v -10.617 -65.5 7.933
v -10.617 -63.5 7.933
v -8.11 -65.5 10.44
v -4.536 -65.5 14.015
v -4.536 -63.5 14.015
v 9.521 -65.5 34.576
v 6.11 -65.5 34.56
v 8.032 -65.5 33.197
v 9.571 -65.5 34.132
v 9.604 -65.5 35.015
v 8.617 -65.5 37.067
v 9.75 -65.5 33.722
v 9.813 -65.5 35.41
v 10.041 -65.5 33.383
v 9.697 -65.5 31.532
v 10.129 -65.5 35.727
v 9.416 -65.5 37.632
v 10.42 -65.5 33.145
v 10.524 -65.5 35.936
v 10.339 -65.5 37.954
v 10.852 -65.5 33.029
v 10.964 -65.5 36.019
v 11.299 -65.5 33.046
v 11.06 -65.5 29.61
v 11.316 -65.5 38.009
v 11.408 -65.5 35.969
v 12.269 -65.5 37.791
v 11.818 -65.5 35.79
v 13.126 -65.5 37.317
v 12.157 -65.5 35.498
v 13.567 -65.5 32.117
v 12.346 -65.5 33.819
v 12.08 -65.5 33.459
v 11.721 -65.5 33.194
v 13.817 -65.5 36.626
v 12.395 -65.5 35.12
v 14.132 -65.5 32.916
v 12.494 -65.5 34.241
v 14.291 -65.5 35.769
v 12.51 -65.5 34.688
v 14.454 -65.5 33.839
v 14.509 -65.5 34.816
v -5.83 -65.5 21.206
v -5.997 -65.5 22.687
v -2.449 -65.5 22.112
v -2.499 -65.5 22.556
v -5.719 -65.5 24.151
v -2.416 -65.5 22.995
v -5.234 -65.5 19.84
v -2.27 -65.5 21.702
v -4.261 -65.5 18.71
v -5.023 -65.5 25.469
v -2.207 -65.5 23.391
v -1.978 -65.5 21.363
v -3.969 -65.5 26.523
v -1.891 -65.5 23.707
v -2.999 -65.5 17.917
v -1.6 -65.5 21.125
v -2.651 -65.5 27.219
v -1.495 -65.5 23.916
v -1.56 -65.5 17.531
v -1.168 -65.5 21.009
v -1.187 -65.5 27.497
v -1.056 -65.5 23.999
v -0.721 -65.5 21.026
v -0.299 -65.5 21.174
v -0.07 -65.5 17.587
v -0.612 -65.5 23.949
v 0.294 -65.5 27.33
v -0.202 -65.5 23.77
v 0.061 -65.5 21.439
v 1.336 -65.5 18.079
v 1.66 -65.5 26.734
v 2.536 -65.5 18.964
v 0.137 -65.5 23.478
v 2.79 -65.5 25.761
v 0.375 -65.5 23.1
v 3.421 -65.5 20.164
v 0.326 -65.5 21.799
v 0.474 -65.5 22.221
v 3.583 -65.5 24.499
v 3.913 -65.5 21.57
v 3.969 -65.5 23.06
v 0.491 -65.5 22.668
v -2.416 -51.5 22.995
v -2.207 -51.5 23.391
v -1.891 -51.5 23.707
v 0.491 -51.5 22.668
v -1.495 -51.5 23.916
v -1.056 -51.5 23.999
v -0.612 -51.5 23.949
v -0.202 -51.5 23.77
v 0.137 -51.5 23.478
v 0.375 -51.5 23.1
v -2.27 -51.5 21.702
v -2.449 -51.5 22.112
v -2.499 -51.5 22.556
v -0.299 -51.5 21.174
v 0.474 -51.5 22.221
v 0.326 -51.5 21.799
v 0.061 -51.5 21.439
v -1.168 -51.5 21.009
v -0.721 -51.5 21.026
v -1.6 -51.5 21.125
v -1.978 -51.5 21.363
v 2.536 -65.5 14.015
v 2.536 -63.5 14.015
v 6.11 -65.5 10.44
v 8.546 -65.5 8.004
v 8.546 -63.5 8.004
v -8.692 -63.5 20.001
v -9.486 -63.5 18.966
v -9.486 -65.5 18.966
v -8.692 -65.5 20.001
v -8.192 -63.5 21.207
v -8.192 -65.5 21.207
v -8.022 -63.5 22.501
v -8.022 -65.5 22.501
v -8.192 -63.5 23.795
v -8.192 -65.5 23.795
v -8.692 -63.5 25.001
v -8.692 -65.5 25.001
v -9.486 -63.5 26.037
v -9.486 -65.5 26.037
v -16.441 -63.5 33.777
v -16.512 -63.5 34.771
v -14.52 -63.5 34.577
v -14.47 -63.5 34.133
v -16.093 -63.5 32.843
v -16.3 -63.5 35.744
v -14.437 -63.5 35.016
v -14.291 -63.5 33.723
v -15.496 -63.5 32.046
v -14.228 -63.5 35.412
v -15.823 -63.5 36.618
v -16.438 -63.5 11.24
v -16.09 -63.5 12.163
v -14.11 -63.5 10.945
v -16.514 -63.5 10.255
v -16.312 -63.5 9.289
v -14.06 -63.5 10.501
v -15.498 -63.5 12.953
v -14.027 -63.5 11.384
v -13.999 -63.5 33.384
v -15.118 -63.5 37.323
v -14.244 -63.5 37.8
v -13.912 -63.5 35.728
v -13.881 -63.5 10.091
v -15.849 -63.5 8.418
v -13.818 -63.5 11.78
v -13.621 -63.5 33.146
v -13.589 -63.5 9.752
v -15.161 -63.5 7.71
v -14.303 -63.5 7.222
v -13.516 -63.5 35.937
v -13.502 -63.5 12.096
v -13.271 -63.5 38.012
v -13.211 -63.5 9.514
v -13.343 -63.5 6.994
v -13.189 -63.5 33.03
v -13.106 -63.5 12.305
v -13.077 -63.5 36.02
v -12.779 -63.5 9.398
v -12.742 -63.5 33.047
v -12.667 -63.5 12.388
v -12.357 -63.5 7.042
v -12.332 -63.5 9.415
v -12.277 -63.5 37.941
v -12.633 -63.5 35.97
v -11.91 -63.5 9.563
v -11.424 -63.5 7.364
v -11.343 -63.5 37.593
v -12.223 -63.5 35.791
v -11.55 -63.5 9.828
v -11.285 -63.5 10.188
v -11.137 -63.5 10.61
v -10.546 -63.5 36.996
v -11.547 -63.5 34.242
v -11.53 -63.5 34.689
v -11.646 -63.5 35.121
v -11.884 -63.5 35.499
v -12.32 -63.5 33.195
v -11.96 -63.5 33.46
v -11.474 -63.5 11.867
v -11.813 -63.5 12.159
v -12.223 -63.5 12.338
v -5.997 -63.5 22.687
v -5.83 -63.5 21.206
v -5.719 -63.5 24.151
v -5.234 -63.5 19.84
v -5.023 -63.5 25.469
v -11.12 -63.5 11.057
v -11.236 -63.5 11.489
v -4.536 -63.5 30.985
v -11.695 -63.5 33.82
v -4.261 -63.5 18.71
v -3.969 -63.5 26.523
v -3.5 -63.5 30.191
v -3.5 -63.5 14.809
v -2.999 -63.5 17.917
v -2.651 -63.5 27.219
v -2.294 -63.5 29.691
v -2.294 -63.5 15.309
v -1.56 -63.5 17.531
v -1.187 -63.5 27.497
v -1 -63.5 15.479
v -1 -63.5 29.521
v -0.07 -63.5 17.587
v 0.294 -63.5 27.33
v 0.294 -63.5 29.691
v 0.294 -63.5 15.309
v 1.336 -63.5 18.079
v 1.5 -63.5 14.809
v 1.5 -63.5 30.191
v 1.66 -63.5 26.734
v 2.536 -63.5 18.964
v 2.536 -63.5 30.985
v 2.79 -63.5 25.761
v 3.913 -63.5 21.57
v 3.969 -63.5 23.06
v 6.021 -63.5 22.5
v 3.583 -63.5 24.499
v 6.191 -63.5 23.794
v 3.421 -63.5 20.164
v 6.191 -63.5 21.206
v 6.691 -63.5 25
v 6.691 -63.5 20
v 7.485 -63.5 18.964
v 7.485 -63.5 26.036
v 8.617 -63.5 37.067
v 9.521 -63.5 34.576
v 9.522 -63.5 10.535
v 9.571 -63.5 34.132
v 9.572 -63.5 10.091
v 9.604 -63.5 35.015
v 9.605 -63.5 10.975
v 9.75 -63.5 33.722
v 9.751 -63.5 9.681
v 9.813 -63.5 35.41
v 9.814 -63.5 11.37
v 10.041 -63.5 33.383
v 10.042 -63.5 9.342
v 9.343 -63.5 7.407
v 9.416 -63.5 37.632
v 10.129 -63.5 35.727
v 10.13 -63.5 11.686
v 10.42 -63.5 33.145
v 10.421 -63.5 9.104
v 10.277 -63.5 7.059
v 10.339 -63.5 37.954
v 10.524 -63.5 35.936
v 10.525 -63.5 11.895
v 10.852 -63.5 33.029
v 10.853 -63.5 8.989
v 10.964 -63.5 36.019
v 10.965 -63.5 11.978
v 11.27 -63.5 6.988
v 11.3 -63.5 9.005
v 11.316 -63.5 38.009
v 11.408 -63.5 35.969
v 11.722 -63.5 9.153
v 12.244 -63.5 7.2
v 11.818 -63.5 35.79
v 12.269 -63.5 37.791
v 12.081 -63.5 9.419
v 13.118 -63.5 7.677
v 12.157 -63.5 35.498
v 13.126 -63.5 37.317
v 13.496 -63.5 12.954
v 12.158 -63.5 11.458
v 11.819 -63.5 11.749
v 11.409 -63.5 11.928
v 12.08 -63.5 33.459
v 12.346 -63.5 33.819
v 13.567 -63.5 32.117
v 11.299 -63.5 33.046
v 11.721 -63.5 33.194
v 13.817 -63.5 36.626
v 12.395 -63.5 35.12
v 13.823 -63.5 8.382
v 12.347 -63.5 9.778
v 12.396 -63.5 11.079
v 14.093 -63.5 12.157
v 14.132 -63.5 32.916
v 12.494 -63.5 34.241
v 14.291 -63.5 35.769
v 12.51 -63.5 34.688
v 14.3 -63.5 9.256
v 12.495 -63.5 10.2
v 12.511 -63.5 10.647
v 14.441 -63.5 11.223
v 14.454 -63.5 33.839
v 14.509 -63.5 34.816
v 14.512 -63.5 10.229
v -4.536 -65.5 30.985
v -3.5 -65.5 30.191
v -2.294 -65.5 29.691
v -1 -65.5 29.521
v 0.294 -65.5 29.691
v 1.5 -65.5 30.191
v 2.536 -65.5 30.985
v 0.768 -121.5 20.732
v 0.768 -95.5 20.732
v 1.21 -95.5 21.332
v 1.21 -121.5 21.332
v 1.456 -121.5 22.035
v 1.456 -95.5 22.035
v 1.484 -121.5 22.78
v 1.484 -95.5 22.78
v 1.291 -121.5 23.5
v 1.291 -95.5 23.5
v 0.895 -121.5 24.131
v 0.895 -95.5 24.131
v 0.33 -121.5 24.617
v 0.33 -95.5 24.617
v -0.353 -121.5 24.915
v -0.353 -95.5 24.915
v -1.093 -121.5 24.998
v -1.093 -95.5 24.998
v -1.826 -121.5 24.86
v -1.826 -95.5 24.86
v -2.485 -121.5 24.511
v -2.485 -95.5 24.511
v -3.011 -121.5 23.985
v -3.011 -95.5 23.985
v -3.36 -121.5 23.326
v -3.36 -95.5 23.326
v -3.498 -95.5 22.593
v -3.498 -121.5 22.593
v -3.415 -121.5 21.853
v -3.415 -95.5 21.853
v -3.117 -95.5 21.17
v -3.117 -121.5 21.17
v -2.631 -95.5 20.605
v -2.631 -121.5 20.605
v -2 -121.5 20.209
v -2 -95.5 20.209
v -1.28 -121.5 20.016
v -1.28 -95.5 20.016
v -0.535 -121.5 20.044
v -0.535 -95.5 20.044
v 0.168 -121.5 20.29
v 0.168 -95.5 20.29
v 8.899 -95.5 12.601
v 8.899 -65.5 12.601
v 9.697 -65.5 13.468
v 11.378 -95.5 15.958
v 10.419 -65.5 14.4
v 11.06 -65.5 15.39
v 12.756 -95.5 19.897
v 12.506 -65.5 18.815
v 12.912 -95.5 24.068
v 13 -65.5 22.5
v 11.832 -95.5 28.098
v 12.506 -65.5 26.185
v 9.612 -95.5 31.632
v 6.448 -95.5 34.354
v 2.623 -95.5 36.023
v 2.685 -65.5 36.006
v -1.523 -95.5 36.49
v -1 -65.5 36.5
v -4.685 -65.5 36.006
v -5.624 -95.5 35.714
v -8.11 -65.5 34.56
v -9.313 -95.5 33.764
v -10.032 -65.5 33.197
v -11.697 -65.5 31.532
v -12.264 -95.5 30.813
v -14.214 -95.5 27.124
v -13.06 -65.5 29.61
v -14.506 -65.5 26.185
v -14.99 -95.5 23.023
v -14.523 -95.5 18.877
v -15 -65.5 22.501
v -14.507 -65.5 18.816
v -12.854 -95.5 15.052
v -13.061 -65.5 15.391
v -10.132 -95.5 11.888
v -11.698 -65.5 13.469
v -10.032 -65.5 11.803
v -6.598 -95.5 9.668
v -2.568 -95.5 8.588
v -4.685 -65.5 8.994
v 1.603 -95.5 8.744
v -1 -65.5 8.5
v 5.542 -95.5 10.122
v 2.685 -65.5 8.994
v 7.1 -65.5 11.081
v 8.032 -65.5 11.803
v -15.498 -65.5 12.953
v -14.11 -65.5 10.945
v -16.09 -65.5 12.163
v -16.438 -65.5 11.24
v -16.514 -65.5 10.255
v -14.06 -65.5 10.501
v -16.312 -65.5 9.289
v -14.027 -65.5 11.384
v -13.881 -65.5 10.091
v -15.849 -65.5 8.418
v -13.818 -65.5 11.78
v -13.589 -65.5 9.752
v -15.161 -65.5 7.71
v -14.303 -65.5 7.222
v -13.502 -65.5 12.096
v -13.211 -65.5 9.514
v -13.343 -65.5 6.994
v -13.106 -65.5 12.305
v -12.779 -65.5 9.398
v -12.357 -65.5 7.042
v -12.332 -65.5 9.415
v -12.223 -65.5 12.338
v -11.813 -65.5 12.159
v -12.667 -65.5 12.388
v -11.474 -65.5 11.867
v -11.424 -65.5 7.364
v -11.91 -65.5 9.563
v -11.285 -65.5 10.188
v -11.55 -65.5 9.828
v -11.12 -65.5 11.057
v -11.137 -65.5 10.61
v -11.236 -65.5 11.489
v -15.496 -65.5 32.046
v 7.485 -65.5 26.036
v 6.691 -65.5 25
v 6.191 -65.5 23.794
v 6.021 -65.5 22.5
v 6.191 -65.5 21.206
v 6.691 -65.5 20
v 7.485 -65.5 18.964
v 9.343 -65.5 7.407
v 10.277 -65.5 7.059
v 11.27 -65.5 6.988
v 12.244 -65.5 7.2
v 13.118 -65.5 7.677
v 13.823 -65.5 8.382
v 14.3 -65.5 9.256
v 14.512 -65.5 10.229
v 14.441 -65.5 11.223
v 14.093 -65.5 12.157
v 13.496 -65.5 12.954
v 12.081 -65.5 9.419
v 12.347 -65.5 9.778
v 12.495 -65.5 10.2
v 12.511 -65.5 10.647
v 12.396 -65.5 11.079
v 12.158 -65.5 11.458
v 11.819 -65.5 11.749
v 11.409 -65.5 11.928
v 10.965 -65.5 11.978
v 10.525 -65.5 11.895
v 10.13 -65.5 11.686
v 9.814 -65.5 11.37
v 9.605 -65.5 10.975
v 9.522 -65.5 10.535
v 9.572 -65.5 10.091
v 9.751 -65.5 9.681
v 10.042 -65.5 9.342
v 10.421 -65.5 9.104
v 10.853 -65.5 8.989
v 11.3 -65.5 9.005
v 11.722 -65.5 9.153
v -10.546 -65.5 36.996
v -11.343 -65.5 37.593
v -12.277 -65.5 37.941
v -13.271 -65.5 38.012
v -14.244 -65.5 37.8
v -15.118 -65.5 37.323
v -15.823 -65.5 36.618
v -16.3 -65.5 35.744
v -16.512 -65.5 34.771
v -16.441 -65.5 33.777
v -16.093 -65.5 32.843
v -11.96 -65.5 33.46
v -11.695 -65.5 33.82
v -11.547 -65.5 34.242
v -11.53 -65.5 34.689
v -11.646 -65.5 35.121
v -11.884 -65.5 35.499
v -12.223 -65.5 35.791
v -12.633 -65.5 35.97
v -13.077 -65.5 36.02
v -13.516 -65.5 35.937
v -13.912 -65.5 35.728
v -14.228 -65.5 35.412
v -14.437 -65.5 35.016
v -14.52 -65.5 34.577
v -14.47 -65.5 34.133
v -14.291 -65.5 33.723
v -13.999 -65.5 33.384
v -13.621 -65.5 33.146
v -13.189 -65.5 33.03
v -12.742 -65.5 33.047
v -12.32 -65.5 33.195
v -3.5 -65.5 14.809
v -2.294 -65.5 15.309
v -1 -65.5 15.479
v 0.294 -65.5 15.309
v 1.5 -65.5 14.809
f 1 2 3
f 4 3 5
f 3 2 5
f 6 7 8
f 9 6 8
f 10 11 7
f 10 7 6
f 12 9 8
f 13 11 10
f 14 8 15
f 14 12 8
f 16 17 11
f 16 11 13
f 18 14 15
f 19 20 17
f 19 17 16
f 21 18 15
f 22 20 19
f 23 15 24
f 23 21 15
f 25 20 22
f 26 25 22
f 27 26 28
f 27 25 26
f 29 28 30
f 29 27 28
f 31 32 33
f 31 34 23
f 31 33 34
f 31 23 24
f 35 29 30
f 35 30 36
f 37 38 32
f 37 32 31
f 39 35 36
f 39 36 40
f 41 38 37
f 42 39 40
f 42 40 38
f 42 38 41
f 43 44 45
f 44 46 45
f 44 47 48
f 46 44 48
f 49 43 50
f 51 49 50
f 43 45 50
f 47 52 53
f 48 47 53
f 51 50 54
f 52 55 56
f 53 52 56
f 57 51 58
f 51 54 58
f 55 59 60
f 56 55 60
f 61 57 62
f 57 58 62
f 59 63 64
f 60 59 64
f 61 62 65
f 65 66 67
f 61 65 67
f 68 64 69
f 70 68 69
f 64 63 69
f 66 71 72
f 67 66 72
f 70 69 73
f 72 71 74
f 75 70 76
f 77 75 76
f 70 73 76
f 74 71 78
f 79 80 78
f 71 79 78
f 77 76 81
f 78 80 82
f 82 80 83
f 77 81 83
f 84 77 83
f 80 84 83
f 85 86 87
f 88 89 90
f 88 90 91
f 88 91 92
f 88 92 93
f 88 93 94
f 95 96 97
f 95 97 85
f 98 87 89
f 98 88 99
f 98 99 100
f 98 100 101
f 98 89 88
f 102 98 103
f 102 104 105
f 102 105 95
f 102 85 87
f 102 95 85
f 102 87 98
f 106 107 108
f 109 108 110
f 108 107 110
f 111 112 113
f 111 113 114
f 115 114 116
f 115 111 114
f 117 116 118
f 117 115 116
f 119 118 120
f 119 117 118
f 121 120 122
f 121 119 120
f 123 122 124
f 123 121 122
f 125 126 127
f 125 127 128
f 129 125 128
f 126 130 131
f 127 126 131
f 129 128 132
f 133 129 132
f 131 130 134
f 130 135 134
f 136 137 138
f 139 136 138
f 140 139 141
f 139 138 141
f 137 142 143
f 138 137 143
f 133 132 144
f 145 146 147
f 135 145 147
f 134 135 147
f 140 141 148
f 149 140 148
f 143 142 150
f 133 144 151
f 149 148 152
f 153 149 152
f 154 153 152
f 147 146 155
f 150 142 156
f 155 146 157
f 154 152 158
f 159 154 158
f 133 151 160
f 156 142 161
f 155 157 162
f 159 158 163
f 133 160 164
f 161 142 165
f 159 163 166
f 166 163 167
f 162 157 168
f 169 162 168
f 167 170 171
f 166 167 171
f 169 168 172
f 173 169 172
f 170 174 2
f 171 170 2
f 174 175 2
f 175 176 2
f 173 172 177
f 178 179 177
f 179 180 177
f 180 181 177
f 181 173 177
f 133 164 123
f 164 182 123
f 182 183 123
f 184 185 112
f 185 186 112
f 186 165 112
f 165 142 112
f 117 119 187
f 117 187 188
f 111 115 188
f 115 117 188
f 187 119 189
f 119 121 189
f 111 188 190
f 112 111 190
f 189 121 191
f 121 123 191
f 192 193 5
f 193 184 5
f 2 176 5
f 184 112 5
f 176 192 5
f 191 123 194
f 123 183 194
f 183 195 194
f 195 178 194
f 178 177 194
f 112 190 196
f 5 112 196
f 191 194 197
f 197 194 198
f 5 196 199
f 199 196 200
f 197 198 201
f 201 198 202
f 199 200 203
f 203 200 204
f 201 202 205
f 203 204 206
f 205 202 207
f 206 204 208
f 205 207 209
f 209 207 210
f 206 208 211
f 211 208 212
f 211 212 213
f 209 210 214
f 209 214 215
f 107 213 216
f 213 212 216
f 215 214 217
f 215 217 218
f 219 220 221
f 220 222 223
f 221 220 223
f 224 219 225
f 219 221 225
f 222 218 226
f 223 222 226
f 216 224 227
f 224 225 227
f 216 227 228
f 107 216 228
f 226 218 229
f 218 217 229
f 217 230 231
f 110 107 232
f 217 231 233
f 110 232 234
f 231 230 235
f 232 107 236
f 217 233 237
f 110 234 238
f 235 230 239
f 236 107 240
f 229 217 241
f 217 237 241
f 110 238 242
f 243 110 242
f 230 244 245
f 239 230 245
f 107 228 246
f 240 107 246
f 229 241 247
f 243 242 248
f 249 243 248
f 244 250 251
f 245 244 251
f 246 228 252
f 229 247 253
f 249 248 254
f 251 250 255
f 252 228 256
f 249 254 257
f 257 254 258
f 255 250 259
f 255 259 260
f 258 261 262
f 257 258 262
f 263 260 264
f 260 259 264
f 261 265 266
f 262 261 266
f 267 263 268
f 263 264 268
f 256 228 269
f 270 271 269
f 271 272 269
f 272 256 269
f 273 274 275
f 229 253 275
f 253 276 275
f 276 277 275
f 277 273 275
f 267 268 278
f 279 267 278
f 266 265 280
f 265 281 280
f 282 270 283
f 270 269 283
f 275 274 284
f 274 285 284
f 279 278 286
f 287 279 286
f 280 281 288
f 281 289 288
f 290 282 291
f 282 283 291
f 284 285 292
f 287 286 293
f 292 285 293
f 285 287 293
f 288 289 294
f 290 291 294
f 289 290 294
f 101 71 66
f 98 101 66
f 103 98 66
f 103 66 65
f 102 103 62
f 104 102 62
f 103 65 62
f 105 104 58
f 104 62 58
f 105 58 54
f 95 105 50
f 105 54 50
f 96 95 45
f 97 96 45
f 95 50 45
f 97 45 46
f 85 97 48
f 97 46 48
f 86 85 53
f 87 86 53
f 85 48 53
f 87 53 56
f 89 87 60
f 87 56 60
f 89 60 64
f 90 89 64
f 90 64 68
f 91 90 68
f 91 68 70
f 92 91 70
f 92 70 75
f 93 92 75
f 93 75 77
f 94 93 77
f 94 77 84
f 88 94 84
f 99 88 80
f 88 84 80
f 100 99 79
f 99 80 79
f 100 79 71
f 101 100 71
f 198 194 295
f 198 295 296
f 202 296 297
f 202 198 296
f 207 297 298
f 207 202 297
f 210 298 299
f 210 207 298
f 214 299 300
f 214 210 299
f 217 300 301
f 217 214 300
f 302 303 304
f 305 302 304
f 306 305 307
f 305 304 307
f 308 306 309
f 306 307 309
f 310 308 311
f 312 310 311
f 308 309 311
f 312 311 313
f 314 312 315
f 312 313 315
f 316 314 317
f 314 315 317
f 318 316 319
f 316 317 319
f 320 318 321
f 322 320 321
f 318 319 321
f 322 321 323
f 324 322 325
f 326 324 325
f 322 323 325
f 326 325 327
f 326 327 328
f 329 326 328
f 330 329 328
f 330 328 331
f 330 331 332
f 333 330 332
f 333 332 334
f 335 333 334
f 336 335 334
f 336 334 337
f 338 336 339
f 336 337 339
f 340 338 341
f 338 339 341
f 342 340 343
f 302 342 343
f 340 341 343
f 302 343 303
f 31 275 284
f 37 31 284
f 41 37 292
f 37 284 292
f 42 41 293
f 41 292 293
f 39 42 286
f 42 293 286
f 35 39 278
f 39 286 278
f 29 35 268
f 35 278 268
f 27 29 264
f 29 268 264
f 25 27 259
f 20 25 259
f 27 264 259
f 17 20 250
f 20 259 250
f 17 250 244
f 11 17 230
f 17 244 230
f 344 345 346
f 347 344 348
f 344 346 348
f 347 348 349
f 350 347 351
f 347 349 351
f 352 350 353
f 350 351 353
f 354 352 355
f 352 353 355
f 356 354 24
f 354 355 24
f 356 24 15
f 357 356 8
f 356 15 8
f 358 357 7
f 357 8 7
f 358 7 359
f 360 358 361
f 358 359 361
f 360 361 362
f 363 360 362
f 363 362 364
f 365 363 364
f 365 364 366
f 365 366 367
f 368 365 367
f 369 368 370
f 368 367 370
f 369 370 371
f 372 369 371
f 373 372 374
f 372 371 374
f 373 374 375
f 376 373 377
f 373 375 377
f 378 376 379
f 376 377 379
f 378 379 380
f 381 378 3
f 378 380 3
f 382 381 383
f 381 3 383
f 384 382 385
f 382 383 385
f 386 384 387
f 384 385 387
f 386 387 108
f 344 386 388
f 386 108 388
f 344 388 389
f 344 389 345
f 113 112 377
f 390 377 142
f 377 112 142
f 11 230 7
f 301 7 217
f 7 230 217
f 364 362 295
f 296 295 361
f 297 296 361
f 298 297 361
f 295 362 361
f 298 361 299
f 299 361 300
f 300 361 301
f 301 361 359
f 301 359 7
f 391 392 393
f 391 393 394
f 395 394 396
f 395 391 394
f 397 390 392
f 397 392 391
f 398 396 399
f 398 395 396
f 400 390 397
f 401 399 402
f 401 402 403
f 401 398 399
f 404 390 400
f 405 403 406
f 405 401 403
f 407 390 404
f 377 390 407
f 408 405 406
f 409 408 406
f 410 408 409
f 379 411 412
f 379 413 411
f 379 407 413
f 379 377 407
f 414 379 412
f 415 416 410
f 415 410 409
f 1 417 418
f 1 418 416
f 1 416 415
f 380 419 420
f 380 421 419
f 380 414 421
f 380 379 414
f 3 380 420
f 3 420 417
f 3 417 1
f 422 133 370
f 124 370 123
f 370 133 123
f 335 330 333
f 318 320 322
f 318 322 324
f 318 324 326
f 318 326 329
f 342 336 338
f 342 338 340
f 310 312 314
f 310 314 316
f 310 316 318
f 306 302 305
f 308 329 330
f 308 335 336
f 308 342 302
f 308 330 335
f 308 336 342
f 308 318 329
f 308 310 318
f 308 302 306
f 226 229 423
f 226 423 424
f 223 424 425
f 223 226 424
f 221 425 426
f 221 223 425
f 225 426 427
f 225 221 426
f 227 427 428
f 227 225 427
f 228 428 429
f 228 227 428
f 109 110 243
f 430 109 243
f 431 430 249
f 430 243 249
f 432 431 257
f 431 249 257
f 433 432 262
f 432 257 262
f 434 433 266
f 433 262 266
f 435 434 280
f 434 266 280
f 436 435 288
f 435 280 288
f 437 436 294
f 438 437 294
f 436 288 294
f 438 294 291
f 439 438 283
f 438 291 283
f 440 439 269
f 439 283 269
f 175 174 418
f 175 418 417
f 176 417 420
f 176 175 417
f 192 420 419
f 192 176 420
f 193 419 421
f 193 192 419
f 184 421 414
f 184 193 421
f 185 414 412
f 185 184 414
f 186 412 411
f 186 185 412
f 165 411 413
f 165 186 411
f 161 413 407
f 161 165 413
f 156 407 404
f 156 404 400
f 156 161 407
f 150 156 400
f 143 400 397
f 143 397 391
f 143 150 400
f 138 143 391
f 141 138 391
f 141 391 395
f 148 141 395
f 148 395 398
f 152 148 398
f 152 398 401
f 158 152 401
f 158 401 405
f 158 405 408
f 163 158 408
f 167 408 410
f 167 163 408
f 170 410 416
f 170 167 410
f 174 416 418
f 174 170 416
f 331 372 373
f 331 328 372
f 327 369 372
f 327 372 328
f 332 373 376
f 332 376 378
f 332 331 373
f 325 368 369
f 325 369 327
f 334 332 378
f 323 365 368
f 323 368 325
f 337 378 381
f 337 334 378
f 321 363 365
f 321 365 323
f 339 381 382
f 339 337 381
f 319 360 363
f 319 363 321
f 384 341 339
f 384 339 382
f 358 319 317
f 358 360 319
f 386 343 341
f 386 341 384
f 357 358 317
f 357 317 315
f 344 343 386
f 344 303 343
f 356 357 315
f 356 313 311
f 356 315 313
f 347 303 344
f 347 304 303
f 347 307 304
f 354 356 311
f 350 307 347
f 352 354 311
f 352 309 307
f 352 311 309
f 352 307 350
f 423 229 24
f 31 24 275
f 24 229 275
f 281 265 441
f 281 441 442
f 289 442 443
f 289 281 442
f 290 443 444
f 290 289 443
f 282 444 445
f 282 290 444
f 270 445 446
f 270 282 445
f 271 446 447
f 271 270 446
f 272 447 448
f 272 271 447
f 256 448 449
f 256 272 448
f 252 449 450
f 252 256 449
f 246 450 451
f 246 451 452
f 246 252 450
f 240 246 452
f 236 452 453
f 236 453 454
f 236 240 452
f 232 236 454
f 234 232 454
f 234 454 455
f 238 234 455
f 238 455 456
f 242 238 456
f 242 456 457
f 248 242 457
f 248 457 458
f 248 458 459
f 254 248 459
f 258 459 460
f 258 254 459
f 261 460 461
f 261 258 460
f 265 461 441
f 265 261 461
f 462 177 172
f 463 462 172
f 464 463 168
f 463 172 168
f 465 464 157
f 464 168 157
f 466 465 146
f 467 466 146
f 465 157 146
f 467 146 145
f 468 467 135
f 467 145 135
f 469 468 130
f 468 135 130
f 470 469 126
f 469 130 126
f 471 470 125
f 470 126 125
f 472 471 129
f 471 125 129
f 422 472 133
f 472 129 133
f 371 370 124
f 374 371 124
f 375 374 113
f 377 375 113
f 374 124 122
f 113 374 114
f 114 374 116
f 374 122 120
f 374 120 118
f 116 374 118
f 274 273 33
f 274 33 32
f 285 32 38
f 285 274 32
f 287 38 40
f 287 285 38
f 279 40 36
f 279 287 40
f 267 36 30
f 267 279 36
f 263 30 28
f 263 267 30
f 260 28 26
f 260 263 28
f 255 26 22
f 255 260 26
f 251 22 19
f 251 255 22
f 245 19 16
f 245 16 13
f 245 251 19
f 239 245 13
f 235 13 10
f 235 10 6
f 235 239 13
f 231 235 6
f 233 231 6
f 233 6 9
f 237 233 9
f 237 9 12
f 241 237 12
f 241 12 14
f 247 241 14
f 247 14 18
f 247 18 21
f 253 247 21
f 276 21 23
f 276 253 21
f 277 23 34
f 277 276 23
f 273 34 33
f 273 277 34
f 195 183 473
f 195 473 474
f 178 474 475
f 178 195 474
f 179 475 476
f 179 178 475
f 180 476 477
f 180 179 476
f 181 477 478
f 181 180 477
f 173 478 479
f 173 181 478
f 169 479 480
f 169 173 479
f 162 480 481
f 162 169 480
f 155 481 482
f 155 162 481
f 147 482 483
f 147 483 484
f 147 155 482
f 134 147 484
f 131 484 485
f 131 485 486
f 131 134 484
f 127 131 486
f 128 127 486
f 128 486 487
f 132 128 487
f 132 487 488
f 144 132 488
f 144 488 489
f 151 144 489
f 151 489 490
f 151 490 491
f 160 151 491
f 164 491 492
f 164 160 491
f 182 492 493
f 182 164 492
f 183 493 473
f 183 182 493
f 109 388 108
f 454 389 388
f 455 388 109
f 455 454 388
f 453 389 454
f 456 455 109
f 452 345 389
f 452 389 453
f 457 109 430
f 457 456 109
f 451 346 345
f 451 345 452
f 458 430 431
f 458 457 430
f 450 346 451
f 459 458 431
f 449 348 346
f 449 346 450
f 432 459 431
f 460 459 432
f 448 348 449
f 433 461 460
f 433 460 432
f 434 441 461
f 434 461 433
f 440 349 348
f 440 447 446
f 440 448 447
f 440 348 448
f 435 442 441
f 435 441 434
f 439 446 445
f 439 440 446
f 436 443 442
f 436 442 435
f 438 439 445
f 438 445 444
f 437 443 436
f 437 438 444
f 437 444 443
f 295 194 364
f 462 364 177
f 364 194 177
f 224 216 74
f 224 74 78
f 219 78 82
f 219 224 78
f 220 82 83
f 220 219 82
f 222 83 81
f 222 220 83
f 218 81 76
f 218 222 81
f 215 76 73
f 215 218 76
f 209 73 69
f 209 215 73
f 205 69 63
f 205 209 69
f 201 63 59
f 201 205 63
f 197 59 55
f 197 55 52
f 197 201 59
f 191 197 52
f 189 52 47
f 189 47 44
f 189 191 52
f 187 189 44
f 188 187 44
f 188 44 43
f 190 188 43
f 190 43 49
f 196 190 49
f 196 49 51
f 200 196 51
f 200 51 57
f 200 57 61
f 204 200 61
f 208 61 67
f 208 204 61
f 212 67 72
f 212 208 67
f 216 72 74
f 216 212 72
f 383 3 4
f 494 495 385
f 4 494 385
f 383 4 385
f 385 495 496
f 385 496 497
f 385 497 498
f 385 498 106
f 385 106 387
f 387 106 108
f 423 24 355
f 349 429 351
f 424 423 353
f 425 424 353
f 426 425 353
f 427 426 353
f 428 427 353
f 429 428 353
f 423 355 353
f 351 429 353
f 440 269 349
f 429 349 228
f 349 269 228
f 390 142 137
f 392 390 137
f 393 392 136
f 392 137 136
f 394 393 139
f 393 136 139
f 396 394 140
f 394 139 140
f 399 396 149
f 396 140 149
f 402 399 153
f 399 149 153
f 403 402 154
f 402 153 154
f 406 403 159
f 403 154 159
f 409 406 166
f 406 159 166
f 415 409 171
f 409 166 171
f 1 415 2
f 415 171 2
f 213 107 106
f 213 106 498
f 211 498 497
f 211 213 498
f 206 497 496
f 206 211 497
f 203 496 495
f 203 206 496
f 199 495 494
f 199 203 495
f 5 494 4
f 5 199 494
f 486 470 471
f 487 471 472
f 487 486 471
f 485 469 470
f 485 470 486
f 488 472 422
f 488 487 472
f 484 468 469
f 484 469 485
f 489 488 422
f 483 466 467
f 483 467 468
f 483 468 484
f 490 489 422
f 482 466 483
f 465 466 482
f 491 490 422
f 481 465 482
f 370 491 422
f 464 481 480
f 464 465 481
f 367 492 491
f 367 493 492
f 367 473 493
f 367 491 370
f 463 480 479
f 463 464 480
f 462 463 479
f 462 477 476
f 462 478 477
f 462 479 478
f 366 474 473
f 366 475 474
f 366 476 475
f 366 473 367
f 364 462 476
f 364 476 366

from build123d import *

# Parameters (mm, degrees)
SKETCH052_R             = 1.5
SKETCH052_R_2           = 5
PAD031_DEPTH            = 2
SKETCH053_R             = 14
PAD032_DEPTH            = 30
SKETCH054_R             = 1.5
PAD033_DEPTH            = 14
SKETCH055_R             = 2.5
PAD034_DEPTH            = 26
BODY014_PLACEMENT_ANGLE = 45


with BuildPart() as part:
    # Sketch052 → Pad031 (new body)
    with BuildSketch(Plane.XZ):
        with BuildLine():
            ThreePointArc((3.5, 17.100732), (0, 20.5), (-3.5, 17.100732))
            Line((-3.5, 17.100732), (-3.5, 8.5))
            ThreePointArc((-8.5, 3.5), (-4.964466, 4.964466), (-3.5, 8.5))
            Line((-8.5, 3.5), (-17, 3.5))
            ThreePointArc((-17, 3.5), (-20.5, 0), (-17, -3.5))
            Line((-17, -3.5), (-8.50149, -3.5))
            ThreePointArc((-3.50149, -8.5), (-4.965956, -4.964466), (-8.50149, -3.5))
            Line((-3.50149, -8.5), (-3.50149, -17.002433))
            ThreePointArc((-3.50149, -17.002433), (-0.049155, -20.499656), (3.5, -17.100733))
            Line((3.5, -17.100733), (3.5, -8.5))
            ThreePointArc((8.5, -3.5), (4.964466, -4.964466), (3.5, -8.5))
            Line((8.5, -3.5), (16.999956, -3.5))
            ThreePointArc((16.999956, -3.5), (20.5, -2.2e-05), (17, 3.5))
            Line((17, 3.5), (8.5, 3.5))
            ThreePointArc((3.5, 8.5), (4.964466, 4.964466), (8.5, 3.5))
            Line((3.5, 8.5), (3.5, 17.100732))
        make_face()
        with Locations((0, 16.998507)):
            Circle(SKETCH052_R, mode=Mode.SUBTRACT)
        with Locations((-17, 0)):
            Circle(SKETCH052_R, mode=Mode.SUBTRACT)
        with Locations((17, 0)):
            Circle(SKETCH052_R, mode=Mode.SUBTRACT)
        with Locations((0, -16.420498)):
            Circle(SKETCH052_R, mode=Mode.SUBTRACT)
        Circle(SKETCH052_R_2, mode=Mode.SUBTRACT)
    extrude(amount=PAD031_DEPTH)

    # Sketch053 (on Face23 of Pad031) → Pad032 (join)
    with BuildSketch(Plane.XZ.offset(2)):
        Circle(SKETCH053_R)
    extrude(amount=PAD032_DEPTH)

    # Sketch054 (on Face32 of Pad032) → Pad033 (join)
    with BuildSketch(Plane(origin=(0, -2, 0), x_dir=(1, 0, 0), z_dir=(0, 1, 0))):
        Circle(SKETCH054_R)
    extrude(amount=PAD033_DEPTH)

    # Sketch055 (on Face33 of Pad033) → Pad034 (join)
    with BuildSketch(Plane.XZ.offset(32)):
        Circle(SKETCH055_R)
    extrude(amount=PAD034_DEPTH)


with BuildPart() as part_1:
    # Body014 placement: moved
    add(part.part.moved(Location((-1, -63.5, 22.5))).rotate(Axis((-1, -63.5, 22.5), (0, 1, 0)), BODY014_PLACEMENT_ANGLE))


solid = part_1.part
